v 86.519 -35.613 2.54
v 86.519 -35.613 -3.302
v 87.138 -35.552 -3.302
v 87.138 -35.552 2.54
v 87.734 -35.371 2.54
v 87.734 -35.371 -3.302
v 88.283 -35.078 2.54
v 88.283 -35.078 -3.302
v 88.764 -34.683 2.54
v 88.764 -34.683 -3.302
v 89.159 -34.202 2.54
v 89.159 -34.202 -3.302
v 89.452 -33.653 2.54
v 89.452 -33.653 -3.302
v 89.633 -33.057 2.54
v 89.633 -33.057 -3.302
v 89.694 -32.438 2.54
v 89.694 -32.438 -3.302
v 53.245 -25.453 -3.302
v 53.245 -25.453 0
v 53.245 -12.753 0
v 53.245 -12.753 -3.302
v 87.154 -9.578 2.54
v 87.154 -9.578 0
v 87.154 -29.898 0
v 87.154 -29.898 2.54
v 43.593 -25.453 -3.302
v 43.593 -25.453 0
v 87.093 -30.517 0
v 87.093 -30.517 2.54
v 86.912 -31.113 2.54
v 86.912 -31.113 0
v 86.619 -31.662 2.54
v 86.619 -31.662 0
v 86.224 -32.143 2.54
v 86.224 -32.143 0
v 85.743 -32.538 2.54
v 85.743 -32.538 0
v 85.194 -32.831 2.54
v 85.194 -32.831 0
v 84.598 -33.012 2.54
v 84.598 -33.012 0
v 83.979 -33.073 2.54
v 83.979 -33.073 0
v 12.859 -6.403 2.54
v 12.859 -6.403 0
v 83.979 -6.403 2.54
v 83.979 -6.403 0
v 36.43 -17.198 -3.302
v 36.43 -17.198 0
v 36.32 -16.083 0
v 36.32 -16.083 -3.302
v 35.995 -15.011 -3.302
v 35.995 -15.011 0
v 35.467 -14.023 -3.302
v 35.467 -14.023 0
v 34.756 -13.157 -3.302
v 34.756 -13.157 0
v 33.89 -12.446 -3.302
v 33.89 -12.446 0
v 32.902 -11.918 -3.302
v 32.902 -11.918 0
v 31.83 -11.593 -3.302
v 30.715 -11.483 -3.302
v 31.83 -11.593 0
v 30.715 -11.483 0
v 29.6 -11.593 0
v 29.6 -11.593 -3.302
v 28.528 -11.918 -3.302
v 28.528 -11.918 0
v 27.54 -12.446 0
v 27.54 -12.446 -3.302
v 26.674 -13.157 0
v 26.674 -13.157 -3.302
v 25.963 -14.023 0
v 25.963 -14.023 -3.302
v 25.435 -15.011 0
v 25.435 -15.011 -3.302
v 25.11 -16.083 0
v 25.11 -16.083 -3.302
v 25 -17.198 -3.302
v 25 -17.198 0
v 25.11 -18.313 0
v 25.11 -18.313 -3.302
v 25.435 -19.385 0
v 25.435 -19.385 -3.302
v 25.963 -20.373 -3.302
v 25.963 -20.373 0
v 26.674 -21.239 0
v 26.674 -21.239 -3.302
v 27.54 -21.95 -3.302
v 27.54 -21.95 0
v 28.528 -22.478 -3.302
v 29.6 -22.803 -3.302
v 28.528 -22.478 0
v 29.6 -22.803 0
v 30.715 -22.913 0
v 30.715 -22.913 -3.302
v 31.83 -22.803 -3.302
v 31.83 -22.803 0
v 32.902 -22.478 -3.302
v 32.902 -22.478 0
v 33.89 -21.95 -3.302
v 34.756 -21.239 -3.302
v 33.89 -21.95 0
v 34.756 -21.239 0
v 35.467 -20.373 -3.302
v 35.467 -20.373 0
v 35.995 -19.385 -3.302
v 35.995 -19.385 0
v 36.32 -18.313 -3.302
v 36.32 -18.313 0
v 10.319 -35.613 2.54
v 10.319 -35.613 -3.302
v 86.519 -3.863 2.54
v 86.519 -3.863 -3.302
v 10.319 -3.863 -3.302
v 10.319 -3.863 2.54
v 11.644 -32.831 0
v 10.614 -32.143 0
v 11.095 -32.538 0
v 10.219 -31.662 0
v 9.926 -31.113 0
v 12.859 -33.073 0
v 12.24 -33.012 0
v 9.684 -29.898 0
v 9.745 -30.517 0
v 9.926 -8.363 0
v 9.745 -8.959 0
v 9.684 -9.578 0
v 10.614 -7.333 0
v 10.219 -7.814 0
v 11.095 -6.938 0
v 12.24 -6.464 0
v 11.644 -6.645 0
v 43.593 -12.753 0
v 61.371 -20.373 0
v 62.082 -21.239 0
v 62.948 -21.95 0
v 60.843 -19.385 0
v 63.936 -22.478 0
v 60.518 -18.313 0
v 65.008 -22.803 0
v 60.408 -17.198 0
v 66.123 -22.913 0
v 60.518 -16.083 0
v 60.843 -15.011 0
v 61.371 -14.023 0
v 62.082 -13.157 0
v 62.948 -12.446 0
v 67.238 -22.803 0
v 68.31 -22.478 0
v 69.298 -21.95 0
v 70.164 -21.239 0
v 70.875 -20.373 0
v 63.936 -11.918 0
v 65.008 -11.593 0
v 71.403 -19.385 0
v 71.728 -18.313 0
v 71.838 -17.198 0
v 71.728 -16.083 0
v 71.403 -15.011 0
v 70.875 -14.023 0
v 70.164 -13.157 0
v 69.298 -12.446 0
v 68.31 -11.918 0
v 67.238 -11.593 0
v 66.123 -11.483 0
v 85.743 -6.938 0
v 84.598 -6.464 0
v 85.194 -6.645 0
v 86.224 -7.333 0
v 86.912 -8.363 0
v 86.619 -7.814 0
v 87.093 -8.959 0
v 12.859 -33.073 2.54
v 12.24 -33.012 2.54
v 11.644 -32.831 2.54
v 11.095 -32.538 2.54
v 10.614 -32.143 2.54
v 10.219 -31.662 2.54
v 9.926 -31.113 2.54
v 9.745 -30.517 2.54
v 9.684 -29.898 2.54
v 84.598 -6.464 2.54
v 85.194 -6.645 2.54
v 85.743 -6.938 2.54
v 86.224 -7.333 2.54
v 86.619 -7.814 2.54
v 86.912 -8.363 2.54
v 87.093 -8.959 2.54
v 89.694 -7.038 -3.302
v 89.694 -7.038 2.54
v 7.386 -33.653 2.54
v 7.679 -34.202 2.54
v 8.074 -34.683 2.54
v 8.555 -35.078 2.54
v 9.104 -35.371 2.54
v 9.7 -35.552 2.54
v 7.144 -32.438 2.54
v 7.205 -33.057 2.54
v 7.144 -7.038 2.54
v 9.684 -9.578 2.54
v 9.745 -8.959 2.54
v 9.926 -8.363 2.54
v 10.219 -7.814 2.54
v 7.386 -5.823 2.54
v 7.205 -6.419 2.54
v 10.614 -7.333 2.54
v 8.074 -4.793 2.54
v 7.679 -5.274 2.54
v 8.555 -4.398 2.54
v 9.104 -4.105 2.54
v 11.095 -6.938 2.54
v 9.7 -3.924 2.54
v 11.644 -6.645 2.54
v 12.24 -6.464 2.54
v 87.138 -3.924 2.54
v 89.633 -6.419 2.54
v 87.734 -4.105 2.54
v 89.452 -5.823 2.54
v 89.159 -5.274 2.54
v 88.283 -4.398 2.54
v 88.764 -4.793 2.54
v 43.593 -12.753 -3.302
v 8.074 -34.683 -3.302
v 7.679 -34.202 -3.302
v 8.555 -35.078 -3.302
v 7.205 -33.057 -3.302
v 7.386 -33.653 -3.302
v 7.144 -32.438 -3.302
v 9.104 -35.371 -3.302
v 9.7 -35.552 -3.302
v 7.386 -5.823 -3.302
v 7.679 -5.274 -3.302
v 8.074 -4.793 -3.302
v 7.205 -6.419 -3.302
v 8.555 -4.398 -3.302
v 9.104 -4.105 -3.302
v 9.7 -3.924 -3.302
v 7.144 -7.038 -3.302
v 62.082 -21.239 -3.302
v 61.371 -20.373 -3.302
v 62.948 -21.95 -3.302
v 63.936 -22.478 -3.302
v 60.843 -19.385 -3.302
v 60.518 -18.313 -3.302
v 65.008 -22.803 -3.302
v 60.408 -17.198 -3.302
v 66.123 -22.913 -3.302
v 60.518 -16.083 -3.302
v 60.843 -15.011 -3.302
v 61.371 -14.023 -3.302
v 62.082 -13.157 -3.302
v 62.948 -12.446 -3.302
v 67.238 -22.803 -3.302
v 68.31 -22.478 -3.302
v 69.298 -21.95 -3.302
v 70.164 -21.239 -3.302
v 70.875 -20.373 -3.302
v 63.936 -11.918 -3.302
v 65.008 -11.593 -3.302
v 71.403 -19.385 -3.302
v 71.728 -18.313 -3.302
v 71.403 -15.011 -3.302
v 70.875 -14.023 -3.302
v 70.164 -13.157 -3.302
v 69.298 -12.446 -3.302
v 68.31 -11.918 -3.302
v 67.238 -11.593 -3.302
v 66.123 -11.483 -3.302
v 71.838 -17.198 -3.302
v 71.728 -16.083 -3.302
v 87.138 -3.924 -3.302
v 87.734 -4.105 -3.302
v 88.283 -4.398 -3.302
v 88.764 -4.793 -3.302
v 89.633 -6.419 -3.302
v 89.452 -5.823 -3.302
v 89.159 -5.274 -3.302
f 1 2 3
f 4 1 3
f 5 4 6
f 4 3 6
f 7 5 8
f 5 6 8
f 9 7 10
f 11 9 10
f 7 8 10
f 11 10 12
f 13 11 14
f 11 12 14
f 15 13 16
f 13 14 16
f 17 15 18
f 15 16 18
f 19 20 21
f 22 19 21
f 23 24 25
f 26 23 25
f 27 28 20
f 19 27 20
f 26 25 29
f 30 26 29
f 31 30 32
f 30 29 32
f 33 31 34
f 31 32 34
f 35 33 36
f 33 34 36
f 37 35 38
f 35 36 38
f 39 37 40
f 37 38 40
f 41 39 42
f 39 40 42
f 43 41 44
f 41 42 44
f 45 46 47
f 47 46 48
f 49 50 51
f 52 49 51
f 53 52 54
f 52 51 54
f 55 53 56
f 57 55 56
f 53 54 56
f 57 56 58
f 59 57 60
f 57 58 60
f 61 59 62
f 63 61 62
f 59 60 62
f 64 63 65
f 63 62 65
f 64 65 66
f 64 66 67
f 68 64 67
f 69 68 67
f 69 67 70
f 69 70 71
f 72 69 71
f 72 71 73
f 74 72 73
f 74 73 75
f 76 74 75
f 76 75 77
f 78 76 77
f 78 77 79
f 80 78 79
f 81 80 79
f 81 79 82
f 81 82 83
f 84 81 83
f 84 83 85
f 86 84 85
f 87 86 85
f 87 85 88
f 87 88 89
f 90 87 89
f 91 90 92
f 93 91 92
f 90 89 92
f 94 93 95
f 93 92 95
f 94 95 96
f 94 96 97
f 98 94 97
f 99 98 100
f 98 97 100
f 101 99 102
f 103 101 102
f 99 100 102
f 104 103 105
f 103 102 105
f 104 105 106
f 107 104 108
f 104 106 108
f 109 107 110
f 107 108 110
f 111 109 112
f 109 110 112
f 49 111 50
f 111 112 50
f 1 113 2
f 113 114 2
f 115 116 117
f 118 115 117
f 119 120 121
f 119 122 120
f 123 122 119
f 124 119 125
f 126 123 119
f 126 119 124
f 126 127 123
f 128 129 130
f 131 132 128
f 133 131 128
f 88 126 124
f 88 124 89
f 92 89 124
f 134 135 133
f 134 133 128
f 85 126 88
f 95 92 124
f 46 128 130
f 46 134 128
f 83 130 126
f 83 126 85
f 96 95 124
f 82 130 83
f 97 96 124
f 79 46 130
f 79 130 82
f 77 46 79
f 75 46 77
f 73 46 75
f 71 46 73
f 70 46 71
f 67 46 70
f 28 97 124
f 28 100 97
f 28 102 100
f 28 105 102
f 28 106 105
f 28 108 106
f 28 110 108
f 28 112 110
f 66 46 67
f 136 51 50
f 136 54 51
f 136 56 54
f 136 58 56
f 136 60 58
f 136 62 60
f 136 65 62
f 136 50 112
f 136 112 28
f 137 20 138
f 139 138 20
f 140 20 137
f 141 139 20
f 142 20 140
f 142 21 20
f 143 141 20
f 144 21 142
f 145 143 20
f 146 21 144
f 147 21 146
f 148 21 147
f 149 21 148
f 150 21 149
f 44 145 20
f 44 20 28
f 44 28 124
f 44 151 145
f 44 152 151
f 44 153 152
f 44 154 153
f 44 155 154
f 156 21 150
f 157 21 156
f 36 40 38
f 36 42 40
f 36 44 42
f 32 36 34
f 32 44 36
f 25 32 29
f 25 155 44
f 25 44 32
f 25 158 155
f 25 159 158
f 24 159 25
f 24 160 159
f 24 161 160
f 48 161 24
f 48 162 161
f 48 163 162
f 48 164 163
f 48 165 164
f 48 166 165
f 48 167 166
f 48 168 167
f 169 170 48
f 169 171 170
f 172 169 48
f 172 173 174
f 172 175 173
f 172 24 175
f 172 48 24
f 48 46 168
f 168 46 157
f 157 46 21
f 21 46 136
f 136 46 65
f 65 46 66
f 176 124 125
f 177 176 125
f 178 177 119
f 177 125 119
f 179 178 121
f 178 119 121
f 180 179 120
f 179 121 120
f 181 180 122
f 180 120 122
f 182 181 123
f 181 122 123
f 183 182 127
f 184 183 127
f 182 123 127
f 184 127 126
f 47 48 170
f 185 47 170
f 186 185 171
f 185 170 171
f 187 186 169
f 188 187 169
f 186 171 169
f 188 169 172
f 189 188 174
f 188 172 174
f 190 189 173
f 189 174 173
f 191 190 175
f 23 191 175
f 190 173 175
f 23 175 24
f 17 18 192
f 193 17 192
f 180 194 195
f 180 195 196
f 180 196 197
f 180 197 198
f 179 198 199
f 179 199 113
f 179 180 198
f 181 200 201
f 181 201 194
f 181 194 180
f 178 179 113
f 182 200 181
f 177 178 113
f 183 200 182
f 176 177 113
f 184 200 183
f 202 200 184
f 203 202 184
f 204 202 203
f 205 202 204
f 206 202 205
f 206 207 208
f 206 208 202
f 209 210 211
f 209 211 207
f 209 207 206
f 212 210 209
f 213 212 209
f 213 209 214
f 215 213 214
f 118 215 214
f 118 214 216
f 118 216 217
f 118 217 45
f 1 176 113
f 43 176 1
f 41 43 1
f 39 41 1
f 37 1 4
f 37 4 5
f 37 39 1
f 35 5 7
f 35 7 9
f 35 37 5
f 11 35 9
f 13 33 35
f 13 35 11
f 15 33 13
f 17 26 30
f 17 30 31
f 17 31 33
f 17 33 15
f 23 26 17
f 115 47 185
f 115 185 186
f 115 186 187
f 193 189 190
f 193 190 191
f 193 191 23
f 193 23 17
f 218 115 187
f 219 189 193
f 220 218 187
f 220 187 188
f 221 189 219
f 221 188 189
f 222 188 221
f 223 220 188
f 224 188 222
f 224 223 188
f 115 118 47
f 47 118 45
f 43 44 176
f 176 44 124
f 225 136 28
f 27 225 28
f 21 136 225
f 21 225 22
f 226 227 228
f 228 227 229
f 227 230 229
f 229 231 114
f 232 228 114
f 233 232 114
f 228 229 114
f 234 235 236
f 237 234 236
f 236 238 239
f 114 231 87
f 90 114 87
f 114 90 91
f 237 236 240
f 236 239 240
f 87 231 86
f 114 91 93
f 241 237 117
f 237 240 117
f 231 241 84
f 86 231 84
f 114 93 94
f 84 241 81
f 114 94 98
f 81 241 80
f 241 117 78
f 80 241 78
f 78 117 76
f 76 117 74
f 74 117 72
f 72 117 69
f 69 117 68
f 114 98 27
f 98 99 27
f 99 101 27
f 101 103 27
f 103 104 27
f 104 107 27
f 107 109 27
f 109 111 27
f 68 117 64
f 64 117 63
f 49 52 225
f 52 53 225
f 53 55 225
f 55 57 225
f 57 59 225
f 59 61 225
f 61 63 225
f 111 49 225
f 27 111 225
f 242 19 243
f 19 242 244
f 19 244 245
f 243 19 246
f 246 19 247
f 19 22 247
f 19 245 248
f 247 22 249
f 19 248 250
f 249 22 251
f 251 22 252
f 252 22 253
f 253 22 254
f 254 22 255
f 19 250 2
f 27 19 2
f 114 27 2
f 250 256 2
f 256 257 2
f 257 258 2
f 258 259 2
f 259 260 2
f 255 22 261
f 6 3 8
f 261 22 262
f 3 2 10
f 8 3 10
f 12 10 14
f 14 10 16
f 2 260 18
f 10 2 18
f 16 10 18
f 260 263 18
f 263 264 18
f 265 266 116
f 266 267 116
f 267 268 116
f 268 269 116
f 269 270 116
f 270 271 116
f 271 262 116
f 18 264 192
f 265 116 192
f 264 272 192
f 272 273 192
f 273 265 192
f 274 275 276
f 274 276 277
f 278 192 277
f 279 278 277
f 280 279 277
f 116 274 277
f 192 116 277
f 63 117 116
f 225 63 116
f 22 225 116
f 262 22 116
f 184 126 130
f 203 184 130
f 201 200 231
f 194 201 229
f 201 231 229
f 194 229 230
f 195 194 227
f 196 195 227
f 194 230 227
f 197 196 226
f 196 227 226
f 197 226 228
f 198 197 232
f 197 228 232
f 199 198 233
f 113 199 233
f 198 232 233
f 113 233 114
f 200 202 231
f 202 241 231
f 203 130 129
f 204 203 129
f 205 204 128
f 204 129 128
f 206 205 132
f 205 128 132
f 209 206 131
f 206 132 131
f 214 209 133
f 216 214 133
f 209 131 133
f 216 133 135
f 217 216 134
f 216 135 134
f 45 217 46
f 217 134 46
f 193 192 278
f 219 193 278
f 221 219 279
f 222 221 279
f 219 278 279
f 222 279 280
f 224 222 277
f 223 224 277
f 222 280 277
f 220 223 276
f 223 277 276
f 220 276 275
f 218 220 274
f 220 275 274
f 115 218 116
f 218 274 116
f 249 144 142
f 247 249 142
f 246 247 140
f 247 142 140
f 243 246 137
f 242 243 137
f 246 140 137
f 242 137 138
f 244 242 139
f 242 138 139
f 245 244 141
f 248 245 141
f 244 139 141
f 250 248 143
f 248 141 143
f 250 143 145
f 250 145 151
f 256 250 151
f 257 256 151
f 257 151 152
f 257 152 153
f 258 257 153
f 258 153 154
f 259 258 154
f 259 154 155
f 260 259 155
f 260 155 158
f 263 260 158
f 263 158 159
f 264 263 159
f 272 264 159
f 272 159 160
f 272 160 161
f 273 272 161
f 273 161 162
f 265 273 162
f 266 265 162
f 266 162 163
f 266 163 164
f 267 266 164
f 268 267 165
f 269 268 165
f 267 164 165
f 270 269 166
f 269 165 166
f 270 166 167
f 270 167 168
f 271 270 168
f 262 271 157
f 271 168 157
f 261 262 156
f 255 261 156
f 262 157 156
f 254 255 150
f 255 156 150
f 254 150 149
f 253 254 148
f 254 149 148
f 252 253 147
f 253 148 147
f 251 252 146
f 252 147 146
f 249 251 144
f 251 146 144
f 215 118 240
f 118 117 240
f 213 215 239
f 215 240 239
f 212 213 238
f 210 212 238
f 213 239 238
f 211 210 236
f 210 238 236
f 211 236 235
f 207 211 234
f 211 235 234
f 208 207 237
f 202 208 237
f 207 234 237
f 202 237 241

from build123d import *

# Parameters (mm, degrees)
F1_DEPTH = 3.302
F2_DEPTH = 2.54
F3_R     = 5.715
F3_W     = 9.652
F3_H     = 4.445
F3_H_2   = 8.255
F4_DEPTH = 3.303


with BuildPart() as f1:
    # F0 (on Top) → F1 (new body)
    with BuildSketch(Plane.XY):
        with BuildLine():
            Line((86.51892, -3.862933), (10.31892, -3.862933))
            ThreePointArc((10.31892, -3.862933), (8.073856, -4.792869), (7.14392, -7.037933))
            Line((7.14392, -7.037933), (7.14392, -32.437933))
            ThreePointArc((7.14392, -32.437933), (8.073856, -34.682997), (10.31892, -35.612933))
            Line((10.31892, -35.612933), (86.51892, -35.612933))
            ThreePointArc((86.51892, -35.612933), (88.763984, -34.682997), (89.69392, -32.437933))
            Line((89.69392, -32.437933), (89.69392, -7.037933))
            ThreePointArc((89.69392, -7.037933), (88.763984, -4.792869), (86.51892, -3.862933))
        make_face()
        with BuildLine():
            Line((83.97892, -33.072933), (12.85892, -33.072933))
            ThreePointArc((12.85892, -33.072933), (10.613856, -32.142997), (9.68392, -29.897933))
            Line((9.68392, -29.897933), (9.68392, -9.577933))
            ThreePointArc((9.68392, -9.577933), (10.613856, -7.332869), (12.85892, -6.402933))
            Line((12.85892, -6.402933), (83.97892, -6.402933))
            ThreePointArc((83.97892, -6.402933), (86.223984, -7.332869), (87.15392, -9.577933))
            Line((87.15392, -9.577933), (87.15392, -29.897933))
            ThreePointArc((87.15392, -29.897933), (86.223984, -32.142997), (83.97892, -33.072933))
        make_face(mode=Mode.SUBTRACT)
        with BuildLine():
            ThreePointArc((9.68392, -29.897933), (10.613856, -32.142997), (12.85892, -33.072933))
            Line((12.85892, -33.072933), (83.97892, -33.072933))
            ThreePointArc((83.97892, -33.072933), (86.223984, -32.142997), (87.15392, -29.897933))
            Line((87.15392, -29.897933), (87.15392, -9.577933))
            ThreePointArc((87.15392, -9.577933), (86.223984, -7.332869), (83.97892, -6.402933))
            Line((83.97892, -6.402933), (12.85892, -6.402933))
            ThreePointArc((12.85892, -6.402933), (10.613856, -7.332869), (9.68392, -9.577933))
            Line((9.68392, -9.577933), (9.68392, -29.897933))
        make_face()
    extrude(amount=-F1_DEPTH)

    # F0 (on Top) → F2 (join)
    with BuildSketch(Plane.XY):
        with BuildLine():
            Line((86.51892, -3.862933), (10.31892, -3.862933))
            ThreePointArc((10.31892, -3.862933), (8.073856, -4.792869), (7.14392, -7.037933))
            Line((7.14392, -7.037933), (7.14392, -32.437933))
            ThreePointArc((7.14392, -32.437933), (8.073856, -34.682997), (10.31892, -35.612933))
            Line((10.31892, -35.612933), (86.51892, -35.612933))
            ThreePointArc((86.51892, -35.612933), (88.763984, -34.682997), (89.69392, -32.437933))
            Line((89.69392, -32.437933), (89.69392, -7.037933))
            ThreePointArc((89.69392, -7.037933), (88.763984, -4.792869), (86.51892, -3.862933))
        make_face()
        with BuildLine():
            Line((83.97892, -33.072933), (12.85892, -33.072933))
            ThreePointArc((12.85892, -33.072933), (10.613856, -32.142997), (9.68392, -29.897933))
            Line((9.68392, -29.897933), (9.68392, -9.577933))
            ThreePointArc((9.68392, -9.577933), (10.613856, -7.332869), (12.85892, -6.402933))
            Line((12.85892, -6.402933), (83.97892, -6.402933))
            ThreePointArc((83.97892, -6.402933), (86.223984, -7.332869), (87.15392, -9.577933))
            Line((87.15392, -9.577933), (87.15392, -29.897933))
            ThreePointArc((87.15392, -29.897933), (86.223984, -32.142997), (83.97892, -33.072933))
        make_face(mode=Mode.SUBTRACT)
    extrude(amount=F2_DEPTH)

    # F3 (on Top) → F4 (cut, through all)
    with BuildSketch(Plane.XY):
        with Locations((30.71512, -17.197933)):
            Circle(F3_R)
        with BuildLine():
            ThreePointArc((71.83772, -17.197933), (66.12272, -11.482933), (60.40772, -17.197933))
            ThreePointArc((60.40772, -17.197933), (66.12272, -22.912933), (71.83772, -17.197933))
        make_face()
        with Locations((48.41892, -14.975433)):
            Rectangle(F3_W, F3_H)
        with Locations((48.41892, -21.325433)):
            Rectangle(F3_W, F3_H_2)
    extrude(amount=-F4_DEPTH, mode=Mode.SUBTRACT)


solid = f1.part
